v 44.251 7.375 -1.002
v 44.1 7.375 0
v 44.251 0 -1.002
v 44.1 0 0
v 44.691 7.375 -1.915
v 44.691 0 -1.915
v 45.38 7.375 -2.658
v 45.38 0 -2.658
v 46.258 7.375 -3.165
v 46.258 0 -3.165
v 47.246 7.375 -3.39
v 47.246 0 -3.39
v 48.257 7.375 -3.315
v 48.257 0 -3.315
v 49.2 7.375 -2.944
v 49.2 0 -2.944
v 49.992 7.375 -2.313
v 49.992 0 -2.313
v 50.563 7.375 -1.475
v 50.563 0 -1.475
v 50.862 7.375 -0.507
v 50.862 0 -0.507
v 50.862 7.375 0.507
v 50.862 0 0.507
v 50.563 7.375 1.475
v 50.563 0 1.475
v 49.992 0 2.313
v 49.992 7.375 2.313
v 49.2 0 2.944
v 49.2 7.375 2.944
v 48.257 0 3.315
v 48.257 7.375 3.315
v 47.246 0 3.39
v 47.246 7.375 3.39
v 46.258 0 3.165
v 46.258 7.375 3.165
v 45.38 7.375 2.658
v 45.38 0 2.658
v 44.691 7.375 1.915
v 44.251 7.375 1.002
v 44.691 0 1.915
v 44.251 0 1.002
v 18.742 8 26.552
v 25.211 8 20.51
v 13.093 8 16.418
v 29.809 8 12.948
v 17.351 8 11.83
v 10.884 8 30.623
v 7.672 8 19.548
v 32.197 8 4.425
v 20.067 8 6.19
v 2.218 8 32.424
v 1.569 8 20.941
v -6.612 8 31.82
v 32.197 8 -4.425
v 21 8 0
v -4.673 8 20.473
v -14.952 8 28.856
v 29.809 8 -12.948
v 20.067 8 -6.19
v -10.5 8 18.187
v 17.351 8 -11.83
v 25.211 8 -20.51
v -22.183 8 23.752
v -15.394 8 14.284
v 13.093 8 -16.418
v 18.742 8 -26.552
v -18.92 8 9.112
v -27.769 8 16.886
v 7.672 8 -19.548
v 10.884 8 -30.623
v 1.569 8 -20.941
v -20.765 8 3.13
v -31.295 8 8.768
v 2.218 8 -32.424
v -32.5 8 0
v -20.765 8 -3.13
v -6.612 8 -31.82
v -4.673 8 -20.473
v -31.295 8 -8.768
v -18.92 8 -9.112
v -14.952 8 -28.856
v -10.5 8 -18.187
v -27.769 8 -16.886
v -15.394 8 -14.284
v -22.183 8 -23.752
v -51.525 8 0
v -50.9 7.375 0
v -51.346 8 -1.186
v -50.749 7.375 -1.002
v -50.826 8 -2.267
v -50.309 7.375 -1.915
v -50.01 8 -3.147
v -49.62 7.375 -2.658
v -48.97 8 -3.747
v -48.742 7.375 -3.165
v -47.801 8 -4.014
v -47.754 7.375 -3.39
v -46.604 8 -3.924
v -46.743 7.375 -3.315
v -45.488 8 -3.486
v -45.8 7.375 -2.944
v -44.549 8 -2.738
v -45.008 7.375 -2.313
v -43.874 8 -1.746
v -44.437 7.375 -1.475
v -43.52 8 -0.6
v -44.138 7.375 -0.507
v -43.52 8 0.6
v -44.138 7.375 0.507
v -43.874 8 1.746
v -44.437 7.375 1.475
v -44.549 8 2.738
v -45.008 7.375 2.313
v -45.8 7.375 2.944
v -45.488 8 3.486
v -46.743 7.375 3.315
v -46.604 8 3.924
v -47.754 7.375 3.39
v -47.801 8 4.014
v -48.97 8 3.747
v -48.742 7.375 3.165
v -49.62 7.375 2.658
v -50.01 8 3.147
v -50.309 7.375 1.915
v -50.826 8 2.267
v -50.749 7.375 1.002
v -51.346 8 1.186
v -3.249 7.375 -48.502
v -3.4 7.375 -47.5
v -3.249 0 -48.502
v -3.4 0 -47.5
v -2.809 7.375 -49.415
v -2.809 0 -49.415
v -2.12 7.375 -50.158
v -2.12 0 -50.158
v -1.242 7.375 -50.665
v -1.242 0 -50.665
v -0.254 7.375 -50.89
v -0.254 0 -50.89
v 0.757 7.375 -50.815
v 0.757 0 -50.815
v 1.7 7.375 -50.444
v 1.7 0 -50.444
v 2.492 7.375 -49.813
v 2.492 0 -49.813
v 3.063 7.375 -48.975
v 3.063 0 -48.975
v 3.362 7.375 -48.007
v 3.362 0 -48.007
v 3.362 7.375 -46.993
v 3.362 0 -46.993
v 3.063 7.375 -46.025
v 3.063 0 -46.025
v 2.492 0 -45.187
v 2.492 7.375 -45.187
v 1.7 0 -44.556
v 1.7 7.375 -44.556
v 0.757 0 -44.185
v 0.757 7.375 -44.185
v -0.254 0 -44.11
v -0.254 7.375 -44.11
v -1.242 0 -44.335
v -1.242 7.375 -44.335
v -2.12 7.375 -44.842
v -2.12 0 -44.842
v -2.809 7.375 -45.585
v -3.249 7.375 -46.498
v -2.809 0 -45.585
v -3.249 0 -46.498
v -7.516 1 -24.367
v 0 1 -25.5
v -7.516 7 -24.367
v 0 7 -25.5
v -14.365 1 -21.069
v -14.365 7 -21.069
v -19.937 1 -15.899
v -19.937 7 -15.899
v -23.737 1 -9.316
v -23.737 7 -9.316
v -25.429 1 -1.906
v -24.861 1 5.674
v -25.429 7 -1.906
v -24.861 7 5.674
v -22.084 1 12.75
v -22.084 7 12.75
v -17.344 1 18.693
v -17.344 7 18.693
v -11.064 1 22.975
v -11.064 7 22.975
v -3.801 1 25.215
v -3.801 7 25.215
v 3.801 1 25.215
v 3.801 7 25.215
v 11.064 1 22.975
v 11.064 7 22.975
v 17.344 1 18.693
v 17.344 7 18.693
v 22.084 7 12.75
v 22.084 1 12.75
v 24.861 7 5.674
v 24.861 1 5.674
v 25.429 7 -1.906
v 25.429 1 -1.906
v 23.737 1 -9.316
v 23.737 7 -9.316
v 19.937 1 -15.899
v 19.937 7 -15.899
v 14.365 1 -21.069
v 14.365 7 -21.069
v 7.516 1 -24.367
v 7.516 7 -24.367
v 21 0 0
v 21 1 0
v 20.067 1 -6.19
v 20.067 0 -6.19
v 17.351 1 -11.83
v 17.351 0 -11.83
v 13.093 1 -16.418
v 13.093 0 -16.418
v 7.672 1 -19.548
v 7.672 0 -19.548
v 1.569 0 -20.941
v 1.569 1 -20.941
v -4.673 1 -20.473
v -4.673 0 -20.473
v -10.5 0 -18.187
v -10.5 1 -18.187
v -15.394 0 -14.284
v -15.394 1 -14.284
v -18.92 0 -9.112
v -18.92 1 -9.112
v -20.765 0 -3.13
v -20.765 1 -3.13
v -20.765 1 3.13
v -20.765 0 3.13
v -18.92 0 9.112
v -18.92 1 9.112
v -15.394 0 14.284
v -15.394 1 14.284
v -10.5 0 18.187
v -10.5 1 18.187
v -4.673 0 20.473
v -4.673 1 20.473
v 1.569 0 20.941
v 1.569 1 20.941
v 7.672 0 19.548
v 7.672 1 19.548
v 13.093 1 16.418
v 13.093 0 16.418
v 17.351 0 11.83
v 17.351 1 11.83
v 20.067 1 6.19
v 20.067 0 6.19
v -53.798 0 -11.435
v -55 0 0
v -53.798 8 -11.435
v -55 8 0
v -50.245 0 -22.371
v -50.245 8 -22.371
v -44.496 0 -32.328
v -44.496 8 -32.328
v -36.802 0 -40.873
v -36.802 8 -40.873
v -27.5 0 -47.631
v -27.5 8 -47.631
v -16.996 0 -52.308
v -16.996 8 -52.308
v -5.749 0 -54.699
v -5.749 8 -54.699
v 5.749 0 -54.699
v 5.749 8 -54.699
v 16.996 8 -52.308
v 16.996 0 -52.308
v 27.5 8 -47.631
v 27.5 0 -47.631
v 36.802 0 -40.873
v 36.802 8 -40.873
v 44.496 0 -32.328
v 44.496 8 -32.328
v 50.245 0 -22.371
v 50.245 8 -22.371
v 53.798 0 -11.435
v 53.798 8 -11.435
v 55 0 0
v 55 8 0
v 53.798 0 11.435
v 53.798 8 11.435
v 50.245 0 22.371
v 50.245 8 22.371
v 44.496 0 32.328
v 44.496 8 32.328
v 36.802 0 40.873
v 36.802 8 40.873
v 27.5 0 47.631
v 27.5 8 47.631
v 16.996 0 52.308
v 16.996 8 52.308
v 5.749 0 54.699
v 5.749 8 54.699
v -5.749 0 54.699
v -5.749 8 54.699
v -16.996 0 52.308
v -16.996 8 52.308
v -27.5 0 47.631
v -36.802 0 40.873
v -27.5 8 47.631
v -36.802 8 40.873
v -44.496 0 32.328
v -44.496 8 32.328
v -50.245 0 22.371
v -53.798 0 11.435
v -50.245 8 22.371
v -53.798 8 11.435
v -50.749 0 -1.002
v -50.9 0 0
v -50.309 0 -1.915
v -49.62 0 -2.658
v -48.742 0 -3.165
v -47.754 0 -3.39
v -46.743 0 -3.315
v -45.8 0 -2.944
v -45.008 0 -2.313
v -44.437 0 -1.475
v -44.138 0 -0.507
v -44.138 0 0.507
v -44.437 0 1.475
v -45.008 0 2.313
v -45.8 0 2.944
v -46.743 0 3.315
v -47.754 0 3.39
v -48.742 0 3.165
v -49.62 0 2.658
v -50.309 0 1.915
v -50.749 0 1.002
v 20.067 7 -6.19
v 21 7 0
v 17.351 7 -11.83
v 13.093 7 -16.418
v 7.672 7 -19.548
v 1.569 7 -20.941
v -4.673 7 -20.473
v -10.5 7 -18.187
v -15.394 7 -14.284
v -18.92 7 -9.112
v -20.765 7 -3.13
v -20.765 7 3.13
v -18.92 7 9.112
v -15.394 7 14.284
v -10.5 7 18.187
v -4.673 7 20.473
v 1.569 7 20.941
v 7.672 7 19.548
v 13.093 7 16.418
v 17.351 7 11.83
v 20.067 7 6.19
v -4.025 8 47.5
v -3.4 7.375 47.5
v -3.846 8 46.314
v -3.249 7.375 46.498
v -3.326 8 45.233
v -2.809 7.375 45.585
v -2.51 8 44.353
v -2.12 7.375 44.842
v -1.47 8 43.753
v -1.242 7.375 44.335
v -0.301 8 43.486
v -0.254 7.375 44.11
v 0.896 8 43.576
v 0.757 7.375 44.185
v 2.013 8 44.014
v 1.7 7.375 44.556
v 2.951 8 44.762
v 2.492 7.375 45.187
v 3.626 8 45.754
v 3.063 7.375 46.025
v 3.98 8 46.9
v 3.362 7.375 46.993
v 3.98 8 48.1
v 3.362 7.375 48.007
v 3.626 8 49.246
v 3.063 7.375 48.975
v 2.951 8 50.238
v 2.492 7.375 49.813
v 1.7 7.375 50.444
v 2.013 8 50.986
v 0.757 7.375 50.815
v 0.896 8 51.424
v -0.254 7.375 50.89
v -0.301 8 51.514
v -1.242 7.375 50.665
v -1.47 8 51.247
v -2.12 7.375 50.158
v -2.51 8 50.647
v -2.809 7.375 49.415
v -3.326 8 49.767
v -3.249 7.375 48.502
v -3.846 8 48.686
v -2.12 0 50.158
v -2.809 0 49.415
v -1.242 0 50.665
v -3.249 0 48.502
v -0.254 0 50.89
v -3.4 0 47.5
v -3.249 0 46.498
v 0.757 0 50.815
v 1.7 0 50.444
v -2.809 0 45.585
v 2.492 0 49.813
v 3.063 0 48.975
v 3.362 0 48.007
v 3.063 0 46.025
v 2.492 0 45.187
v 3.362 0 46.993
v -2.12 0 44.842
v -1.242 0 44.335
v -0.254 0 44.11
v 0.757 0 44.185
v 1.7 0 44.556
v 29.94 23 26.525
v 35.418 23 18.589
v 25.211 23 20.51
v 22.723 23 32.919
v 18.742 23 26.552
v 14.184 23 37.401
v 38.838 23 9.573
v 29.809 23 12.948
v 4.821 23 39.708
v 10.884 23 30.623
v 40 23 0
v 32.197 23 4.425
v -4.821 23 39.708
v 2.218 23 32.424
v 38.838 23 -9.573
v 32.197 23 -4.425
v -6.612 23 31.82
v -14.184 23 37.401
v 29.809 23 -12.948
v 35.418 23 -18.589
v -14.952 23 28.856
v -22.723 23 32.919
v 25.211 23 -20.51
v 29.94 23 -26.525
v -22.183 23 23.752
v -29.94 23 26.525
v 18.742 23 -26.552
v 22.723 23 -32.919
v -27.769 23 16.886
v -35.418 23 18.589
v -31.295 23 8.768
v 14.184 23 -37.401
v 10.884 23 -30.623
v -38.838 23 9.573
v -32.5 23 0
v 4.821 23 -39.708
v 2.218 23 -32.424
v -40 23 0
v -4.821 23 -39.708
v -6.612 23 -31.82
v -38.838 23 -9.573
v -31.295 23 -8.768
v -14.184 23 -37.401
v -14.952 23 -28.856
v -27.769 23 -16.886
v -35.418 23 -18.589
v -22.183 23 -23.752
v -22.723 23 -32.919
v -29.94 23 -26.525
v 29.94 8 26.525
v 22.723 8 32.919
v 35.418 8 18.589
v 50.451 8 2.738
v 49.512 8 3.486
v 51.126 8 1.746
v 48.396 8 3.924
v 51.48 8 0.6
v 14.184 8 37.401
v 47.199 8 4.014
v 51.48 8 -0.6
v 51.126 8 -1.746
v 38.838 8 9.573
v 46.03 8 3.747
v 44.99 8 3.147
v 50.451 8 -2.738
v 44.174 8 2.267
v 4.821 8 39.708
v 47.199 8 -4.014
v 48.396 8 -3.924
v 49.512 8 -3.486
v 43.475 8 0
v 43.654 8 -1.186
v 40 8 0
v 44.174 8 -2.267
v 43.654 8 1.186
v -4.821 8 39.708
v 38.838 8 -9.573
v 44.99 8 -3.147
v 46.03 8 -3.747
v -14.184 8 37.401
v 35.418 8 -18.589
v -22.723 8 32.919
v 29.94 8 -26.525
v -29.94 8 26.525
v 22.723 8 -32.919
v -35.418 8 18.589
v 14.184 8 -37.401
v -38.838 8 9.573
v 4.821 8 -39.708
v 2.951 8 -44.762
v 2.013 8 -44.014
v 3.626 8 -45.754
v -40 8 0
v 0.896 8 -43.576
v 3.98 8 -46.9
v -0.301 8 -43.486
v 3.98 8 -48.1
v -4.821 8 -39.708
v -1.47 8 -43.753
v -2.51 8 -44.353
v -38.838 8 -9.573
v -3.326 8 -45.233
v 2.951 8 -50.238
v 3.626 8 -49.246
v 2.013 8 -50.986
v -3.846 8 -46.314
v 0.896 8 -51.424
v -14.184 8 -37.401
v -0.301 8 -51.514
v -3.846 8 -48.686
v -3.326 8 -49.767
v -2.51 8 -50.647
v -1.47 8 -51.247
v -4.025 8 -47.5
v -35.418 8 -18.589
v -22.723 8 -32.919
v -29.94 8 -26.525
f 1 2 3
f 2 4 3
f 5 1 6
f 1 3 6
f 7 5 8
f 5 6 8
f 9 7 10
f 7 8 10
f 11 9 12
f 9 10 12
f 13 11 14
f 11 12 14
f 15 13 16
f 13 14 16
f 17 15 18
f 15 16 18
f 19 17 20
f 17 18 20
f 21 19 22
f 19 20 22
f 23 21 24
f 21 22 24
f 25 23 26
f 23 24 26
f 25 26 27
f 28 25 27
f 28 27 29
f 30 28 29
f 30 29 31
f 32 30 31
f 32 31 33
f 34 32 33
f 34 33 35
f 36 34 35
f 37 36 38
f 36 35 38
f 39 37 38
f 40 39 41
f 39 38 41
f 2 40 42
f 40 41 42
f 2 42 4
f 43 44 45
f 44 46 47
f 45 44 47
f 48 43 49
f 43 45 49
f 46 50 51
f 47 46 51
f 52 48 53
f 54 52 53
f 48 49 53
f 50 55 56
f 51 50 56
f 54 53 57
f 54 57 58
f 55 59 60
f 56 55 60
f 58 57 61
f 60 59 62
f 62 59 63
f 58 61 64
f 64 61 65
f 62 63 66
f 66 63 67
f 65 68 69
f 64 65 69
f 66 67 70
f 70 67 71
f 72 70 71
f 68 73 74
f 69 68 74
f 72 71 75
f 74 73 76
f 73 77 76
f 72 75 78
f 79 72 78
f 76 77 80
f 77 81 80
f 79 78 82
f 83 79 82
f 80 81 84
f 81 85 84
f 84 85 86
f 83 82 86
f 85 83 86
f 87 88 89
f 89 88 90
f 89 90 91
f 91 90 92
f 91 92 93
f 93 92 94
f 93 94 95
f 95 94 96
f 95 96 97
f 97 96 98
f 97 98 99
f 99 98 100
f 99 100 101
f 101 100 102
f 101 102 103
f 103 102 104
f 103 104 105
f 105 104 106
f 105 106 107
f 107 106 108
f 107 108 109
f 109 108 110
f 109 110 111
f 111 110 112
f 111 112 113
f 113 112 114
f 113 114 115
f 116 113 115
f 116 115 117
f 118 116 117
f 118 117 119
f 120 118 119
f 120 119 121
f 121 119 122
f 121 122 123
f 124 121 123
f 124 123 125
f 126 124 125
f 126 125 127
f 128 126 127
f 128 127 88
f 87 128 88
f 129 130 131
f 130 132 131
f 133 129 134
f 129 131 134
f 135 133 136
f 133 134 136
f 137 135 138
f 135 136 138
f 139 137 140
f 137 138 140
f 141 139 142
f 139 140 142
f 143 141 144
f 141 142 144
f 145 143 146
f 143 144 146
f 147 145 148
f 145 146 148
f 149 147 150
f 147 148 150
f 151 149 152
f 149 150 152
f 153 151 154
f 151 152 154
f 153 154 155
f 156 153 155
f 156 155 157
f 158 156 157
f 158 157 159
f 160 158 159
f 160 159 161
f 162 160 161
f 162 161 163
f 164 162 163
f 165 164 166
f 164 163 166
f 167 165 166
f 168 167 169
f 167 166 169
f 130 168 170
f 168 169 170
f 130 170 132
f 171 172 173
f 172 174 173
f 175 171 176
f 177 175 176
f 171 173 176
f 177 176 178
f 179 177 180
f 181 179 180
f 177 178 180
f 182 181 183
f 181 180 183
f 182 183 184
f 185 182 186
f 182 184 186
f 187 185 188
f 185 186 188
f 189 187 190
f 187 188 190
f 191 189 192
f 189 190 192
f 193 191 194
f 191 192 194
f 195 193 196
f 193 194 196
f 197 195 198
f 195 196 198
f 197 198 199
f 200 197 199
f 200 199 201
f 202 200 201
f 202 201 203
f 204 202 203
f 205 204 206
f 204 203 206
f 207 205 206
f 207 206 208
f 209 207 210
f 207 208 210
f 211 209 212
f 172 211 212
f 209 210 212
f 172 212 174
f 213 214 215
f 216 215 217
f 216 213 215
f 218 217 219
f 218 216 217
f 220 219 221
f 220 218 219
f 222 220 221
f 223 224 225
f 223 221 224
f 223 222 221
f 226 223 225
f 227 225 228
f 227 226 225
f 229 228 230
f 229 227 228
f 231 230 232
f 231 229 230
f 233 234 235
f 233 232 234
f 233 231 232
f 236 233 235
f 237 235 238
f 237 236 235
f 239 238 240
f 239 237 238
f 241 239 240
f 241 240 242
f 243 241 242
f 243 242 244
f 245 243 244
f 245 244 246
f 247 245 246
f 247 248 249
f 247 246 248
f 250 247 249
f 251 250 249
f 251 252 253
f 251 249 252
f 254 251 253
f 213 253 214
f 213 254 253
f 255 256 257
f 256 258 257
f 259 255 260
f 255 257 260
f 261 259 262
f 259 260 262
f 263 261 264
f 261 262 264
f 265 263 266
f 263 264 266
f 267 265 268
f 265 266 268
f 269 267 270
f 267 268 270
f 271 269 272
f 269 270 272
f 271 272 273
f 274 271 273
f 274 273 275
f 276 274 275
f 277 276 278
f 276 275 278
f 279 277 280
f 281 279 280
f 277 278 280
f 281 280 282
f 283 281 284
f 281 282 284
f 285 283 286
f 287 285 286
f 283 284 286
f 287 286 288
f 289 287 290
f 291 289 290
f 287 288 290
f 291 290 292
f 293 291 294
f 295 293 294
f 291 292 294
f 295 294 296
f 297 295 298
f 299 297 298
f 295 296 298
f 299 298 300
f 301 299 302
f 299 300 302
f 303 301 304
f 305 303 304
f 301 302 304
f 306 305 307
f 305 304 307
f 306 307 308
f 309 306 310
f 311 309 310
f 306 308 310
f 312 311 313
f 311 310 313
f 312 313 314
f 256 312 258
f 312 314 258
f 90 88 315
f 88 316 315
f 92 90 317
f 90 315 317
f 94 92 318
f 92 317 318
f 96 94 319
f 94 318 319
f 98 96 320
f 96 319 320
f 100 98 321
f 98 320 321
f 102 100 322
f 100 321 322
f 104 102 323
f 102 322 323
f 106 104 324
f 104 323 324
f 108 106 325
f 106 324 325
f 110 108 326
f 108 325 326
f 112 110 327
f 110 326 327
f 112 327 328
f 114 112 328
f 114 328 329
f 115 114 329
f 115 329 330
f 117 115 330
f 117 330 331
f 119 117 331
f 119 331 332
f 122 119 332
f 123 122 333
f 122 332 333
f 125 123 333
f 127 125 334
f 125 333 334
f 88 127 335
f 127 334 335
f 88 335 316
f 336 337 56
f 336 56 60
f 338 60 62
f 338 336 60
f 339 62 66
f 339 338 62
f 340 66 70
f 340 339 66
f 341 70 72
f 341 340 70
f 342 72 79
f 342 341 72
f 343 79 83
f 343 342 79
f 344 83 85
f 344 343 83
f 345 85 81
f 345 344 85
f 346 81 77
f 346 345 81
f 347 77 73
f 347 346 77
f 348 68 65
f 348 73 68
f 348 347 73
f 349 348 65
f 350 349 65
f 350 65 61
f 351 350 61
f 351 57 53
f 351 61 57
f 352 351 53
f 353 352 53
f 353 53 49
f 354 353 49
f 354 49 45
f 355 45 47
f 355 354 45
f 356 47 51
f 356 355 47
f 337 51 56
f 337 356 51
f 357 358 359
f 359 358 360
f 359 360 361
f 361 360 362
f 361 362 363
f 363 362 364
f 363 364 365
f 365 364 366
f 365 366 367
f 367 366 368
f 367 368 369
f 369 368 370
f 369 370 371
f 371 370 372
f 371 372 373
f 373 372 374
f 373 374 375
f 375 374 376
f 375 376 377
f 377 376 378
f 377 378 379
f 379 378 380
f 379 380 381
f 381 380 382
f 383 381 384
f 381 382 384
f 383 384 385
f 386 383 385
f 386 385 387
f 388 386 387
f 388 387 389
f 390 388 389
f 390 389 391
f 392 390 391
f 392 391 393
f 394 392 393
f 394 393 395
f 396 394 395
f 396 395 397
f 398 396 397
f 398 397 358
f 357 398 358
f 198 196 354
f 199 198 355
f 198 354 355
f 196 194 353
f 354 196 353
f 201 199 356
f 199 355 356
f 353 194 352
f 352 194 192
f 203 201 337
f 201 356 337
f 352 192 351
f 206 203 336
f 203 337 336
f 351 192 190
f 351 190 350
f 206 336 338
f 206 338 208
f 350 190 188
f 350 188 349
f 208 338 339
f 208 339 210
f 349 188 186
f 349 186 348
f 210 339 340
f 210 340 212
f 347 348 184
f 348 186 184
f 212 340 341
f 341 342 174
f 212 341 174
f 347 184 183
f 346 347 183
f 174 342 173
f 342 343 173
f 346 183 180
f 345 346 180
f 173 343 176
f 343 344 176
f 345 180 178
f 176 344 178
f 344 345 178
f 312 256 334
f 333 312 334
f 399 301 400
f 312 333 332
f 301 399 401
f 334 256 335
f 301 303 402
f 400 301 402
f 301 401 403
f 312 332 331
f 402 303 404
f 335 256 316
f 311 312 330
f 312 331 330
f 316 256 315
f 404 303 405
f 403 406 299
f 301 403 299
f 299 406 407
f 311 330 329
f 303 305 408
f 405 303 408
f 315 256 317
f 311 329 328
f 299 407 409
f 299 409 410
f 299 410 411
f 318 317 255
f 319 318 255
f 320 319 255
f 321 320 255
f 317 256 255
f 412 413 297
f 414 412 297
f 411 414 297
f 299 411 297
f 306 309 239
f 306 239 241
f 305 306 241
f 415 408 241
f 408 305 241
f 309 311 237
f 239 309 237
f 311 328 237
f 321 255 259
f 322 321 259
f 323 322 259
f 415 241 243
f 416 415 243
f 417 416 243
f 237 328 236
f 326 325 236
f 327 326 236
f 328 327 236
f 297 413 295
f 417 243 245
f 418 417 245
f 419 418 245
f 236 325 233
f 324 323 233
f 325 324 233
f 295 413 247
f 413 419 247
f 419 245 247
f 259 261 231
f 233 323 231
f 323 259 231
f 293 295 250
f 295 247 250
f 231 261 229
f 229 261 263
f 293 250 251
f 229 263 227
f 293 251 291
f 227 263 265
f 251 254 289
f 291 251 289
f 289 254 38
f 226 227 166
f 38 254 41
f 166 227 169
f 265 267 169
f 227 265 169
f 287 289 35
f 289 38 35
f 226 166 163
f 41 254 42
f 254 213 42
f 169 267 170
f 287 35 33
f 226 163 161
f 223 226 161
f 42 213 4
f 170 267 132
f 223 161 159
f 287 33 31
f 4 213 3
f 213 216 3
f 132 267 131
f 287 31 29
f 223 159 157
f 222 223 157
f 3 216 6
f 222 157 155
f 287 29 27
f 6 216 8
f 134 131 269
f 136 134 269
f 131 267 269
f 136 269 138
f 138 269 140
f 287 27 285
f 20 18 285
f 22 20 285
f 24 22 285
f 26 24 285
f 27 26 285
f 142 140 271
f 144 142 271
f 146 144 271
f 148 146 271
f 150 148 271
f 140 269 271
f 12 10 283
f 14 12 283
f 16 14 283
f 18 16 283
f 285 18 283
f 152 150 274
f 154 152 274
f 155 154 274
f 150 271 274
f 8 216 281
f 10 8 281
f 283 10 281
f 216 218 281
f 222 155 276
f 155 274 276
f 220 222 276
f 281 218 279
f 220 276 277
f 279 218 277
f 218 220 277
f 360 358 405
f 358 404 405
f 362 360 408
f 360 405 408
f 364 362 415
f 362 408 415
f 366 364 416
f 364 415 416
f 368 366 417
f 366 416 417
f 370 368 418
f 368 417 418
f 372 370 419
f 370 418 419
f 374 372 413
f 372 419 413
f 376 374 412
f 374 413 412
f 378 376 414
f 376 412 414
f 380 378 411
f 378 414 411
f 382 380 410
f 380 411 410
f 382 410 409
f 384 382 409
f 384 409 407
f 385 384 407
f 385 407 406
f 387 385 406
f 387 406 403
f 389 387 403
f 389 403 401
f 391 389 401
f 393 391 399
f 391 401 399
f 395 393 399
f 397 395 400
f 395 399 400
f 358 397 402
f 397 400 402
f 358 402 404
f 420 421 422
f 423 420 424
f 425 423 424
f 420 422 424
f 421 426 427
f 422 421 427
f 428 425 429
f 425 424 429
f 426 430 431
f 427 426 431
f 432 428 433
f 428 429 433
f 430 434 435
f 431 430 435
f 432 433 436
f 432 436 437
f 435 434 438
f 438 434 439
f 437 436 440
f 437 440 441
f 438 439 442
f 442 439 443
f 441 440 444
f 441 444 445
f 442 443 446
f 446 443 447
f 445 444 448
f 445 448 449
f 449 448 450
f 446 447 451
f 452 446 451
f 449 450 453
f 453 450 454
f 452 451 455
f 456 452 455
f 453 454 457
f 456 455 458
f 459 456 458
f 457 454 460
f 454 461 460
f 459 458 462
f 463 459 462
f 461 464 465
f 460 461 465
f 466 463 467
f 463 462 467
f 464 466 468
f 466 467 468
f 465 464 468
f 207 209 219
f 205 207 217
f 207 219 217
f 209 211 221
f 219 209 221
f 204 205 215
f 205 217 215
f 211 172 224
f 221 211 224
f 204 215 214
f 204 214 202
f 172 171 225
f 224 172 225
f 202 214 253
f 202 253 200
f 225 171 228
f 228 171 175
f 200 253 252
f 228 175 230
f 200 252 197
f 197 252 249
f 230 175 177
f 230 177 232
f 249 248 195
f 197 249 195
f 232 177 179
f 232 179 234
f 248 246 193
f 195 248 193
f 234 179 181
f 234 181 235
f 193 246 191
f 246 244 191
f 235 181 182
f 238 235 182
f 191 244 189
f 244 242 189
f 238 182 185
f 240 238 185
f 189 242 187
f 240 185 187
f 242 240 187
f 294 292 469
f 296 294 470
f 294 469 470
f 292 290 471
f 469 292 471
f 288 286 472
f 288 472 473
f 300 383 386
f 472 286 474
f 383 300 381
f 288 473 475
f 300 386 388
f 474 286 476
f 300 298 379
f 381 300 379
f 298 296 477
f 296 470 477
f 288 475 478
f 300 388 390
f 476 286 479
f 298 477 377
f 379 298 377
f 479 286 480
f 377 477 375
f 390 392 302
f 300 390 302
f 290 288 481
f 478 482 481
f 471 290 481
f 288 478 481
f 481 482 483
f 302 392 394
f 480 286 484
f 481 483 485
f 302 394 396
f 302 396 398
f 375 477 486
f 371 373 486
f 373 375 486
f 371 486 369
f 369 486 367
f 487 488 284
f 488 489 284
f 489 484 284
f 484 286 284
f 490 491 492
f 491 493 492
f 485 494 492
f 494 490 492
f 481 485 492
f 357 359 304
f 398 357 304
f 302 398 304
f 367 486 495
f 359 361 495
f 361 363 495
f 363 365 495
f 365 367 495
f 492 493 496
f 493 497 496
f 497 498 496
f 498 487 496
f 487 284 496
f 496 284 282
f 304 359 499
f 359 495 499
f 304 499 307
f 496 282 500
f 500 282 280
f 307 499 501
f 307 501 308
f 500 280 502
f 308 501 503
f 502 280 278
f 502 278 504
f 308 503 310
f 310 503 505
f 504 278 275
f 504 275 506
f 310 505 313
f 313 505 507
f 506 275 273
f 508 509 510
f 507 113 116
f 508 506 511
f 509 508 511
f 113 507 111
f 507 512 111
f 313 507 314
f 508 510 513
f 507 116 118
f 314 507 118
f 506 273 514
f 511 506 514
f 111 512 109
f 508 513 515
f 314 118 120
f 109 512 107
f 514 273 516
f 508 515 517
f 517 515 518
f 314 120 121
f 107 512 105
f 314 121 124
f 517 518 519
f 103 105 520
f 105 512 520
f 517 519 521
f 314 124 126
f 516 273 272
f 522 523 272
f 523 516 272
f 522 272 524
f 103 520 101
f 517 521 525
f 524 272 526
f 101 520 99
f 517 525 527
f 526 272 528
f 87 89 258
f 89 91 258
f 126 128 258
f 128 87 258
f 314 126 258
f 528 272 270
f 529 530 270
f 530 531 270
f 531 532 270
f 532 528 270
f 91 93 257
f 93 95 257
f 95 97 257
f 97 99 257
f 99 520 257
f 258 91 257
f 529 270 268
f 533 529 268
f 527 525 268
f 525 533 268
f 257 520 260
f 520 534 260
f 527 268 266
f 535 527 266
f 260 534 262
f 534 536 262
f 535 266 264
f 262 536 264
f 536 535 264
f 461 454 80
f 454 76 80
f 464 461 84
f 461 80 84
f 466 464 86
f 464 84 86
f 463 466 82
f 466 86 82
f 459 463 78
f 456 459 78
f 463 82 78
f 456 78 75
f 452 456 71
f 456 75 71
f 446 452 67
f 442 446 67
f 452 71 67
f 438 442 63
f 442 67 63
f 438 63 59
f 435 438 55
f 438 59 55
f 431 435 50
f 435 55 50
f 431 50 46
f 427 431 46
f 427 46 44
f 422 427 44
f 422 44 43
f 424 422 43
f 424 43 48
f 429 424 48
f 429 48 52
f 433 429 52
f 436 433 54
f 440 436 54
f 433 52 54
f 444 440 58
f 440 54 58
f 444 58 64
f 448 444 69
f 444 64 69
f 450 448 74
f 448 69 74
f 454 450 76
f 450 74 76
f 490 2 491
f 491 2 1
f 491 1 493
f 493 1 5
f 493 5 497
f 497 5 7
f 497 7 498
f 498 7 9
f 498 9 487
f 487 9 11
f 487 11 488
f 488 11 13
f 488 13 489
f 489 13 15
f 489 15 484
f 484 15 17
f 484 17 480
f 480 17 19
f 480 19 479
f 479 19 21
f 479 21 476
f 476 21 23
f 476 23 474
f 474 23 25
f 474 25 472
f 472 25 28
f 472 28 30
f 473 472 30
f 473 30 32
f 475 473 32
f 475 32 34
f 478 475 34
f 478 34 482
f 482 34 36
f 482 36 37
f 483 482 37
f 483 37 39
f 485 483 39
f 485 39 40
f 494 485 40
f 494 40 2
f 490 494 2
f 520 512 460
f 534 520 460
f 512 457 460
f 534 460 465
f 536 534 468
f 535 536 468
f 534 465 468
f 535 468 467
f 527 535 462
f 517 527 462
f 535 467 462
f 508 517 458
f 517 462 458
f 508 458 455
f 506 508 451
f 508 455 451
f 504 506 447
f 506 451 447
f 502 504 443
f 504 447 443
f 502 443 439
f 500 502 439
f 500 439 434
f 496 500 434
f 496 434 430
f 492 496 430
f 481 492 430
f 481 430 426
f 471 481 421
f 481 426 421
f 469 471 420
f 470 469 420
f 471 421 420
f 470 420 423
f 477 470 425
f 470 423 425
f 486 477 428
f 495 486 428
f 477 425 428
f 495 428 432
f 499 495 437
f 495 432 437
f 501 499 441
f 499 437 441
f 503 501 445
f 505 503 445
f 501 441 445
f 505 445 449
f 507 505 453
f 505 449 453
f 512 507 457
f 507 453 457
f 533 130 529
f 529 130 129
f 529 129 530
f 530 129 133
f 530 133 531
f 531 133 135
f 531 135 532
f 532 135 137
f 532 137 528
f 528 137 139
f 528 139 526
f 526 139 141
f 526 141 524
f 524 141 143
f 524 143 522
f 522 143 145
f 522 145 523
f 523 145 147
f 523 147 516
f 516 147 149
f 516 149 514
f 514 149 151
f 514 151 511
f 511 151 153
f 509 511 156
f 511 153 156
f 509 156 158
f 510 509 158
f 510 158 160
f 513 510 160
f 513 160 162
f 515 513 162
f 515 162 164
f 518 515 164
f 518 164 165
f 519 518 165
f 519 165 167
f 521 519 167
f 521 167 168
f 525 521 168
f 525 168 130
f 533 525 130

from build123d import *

# Parameters (mm, degrees)
HOLE_WIZARD_M8_1_D           = 6.8
HOLE_WIZARD_M8_1_CSINK_D     = 8.05
HOLE_WIZARD_M8_1_CSINK_ANGLE = 90
SKETCH_3_R                   = 21
CUT_EXTRUDE_3_DEPTH          = 21


with BuildPart() as part:
    # 草图1 → 旋转1 (revolve)
    with BuildSketch(Plane.XY, mode=Mode.PRIVATE) as revolve_1_sk:
        Polygon((0, 0), (55, 0), (55, 8), (40, 8), (40, 23), (32.5, 23), (32.5, 8), (0, 8), align=None)
    revolve(revolve_1_sk.sketch.rotate(Axis((0, 8, 0), (0, -1, 0)), 180), axis=Axis((0, 8, 0), (0, -1, 0)))

    # M8 螺纹孔1 (through all)
    with Locations(Plane(origin=(0, 8, 0), x_dir=(1, 0, 0), z_dir=(0, 1, 0))):
        with Locations((-47.5, 0), (47.5, 0), (0, -47.5), (0, 47.5)):
            CounterSinkHole(HOLE_WIZARD_M8_1_D / 2, HOLE_WIZARD_M8_1_CSINK_D / 2, counter_sink_angle=HOLE_WIZARD_M8_1_CSINK_ANGLE)

    # 草图3 → 切除-拉伸3 (cut)
    with BuildSketch(Plane(origin=(0, 0, 0), x_dir=(1, 0, 0), z_dir=(0, 1, 0))):
        Circle(SKETCH_3_R)
    extrude(amount=CUT_EXTRUDE_3_DEPTH, mode=Mode.SUBTRACT)

    # 草图4 → 切除-旋转2 (revolve, cut)
    with BuildSketch(Plane(origin=(0, 0, 0), x_dir=(0, 0, -1), z_dir=(1, 0, 0))):
        Polygon((10.5, 7), (10.5, 1), (21, 1), (25.5, 1), (25.5, 4), (25.5, 7), (21, 7), align=None)
    revolve(axis=Axis((0, 0, 0), (0, 1, 0)), mode=Mode.SUBTRACT)


solid = part.part
